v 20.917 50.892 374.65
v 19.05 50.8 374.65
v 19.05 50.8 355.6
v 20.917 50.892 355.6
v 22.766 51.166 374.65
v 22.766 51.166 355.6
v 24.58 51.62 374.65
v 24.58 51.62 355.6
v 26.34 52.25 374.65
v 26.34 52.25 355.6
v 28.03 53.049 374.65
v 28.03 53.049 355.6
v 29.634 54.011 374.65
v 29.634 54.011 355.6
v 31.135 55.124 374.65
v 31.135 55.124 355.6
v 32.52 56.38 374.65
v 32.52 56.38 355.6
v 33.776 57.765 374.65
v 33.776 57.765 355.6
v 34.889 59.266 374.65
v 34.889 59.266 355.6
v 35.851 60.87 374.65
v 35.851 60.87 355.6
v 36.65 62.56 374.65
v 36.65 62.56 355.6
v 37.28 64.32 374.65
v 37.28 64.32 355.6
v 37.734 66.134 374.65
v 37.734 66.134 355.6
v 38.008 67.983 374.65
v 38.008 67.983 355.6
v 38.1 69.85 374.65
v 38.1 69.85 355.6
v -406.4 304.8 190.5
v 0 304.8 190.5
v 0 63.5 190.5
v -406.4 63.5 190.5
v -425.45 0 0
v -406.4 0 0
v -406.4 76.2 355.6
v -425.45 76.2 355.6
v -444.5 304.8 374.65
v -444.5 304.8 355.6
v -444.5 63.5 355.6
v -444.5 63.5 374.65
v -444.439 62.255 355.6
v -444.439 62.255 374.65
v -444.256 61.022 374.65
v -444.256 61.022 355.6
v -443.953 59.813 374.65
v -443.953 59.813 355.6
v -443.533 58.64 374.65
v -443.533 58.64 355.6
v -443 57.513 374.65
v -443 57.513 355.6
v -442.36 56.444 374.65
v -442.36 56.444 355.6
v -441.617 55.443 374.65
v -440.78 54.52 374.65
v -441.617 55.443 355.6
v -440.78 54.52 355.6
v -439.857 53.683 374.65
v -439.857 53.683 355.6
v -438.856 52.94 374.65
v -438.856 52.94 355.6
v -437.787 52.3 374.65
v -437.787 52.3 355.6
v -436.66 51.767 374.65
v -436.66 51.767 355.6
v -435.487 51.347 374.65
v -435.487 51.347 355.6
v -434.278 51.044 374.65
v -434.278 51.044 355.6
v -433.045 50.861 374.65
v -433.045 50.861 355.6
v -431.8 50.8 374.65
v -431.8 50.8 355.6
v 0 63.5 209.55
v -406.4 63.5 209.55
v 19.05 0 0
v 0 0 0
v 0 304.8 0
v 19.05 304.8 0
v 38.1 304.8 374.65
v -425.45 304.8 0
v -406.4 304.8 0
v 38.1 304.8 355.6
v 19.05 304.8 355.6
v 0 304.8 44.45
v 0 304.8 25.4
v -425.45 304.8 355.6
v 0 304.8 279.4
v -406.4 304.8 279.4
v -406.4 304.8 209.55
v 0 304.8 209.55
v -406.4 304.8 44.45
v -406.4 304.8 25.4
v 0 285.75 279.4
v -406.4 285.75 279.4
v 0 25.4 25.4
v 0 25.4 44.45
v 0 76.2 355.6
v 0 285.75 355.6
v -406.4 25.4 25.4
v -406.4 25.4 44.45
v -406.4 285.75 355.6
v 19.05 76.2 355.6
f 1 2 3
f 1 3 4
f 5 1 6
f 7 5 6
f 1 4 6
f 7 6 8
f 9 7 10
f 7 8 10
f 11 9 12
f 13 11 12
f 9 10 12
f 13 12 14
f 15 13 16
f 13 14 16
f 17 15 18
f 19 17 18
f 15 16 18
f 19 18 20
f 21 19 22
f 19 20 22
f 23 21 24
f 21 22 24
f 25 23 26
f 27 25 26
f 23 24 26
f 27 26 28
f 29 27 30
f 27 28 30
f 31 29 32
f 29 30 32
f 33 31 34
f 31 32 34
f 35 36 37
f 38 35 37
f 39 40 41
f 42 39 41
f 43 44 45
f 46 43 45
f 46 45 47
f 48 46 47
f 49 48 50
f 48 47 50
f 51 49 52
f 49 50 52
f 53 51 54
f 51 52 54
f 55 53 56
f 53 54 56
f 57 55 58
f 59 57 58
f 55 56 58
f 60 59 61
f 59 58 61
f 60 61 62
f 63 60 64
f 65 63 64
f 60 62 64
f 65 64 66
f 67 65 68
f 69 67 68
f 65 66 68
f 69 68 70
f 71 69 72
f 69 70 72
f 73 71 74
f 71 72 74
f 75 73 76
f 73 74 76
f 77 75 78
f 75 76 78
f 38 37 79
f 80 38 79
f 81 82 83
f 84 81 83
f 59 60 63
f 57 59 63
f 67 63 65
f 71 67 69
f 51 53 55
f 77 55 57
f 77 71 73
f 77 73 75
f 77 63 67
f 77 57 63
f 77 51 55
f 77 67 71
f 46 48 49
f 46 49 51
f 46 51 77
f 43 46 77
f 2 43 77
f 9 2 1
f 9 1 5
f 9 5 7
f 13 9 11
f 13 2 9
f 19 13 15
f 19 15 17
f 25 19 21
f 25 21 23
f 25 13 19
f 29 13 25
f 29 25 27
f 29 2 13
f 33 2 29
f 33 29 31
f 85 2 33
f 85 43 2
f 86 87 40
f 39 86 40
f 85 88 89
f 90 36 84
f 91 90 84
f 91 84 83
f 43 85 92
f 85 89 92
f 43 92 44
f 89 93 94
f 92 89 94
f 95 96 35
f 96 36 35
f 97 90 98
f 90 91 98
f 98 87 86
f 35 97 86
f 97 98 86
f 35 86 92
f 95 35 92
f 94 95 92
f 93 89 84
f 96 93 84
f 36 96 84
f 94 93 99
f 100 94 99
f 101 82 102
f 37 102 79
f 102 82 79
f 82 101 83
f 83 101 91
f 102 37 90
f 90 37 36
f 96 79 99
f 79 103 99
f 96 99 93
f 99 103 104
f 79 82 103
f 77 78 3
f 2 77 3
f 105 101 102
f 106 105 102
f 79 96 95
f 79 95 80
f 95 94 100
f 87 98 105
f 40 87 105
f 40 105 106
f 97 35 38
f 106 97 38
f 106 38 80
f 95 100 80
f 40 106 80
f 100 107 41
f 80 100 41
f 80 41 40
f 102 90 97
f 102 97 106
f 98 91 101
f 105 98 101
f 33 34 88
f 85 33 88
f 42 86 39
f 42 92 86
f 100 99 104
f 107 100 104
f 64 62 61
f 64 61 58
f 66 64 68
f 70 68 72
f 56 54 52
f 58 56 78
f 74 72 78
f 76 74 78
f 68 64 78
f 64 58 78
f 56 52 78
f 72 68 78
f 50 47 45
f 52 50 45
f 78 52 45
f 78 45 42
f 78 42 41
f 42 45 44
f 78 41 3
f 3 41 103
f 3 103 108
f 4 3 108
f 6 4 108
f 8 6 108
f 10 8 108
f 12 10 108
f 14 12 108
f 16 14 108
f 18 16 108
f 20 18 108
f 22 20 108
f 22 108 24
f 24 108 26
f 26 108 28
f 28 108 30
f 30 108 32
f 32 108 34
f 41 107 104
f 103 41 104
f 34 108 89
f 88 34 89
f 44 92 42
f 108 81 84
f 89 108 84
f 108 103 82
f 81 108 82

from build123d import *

# Parameters (mm, degrees)
F1_DEPTH = 19.05
F2_W     = 279.4
F2_H     = 19.05
F2_W_2   = 241.3
F2_W_3   = 19.05
F2_H_2   = 76.2
F3_DEPTH = 406.4
F5_DEPTH = 19.05
F7_DEPTH = 19.05


with BuildPart() as f1:
    # F0 (on Right) → F1 (new body)
    with BuildSketch(Plane.YZ):
        Polygon((76.2, 355.6), (0, 0), (304.8, 0), (304.8, 355.6), align=None)
    extrude(amount=F1_DEPTH)

    # F2 (on face) → F3 (join)
    with BuildSketch(Plane(origin=(0, 0, 0), x_dir=(0, -1, 0), z_dir=(-1, 0, 0))):
        with Locations((-165.1, 34.925)):
            Rectangle(F2_W, F2_H)
        with Locations((-184.15, 200.025)):
            Rectangle(F2_W_2, F2_H)
        with Locations((-295.275, 317.5)):
            Rectangle(F2_W_3, F2_H_2)
    extrude(amount=F3_DEPTH)

    # F4 (on face) → F5 (join)
    with BuildSketch(Plane(origin=(-406.4, 0, 0), x_dir=(0, -1, 0), z_dir=(-1, 0, 0))):
        Polygon((-304.8, 0), (0, 0), (-76.2, 355.6), (-304.8, 355.6), align=None)
    extrude(amount=F5_DEPTH)

    # F6 (on face) → F7 (join)
    with BuildSketch(Plane.XY.offset(355.6)):
        with BuildLine():
            Line((38.1, 69.85), (38.1, 304.8))
            Line((38.1, 304.8), (-444.5, 304.8))
            Line((-444.5, 304.8), (-444.5, 63.5))
            ThreePointArc((-444.5, 63.5), (-440.780256, 54.519744), (-431.8, 50.8))
            Line((-431.8, 50.8), (19.05, 50.8))
            ThreePointArc((19.05, 50.8), (32.520384, 56.379616), (38.1, 69.85))
        make_face()
    extrude(amount=F7_DEPTH)


solid = f1.part
